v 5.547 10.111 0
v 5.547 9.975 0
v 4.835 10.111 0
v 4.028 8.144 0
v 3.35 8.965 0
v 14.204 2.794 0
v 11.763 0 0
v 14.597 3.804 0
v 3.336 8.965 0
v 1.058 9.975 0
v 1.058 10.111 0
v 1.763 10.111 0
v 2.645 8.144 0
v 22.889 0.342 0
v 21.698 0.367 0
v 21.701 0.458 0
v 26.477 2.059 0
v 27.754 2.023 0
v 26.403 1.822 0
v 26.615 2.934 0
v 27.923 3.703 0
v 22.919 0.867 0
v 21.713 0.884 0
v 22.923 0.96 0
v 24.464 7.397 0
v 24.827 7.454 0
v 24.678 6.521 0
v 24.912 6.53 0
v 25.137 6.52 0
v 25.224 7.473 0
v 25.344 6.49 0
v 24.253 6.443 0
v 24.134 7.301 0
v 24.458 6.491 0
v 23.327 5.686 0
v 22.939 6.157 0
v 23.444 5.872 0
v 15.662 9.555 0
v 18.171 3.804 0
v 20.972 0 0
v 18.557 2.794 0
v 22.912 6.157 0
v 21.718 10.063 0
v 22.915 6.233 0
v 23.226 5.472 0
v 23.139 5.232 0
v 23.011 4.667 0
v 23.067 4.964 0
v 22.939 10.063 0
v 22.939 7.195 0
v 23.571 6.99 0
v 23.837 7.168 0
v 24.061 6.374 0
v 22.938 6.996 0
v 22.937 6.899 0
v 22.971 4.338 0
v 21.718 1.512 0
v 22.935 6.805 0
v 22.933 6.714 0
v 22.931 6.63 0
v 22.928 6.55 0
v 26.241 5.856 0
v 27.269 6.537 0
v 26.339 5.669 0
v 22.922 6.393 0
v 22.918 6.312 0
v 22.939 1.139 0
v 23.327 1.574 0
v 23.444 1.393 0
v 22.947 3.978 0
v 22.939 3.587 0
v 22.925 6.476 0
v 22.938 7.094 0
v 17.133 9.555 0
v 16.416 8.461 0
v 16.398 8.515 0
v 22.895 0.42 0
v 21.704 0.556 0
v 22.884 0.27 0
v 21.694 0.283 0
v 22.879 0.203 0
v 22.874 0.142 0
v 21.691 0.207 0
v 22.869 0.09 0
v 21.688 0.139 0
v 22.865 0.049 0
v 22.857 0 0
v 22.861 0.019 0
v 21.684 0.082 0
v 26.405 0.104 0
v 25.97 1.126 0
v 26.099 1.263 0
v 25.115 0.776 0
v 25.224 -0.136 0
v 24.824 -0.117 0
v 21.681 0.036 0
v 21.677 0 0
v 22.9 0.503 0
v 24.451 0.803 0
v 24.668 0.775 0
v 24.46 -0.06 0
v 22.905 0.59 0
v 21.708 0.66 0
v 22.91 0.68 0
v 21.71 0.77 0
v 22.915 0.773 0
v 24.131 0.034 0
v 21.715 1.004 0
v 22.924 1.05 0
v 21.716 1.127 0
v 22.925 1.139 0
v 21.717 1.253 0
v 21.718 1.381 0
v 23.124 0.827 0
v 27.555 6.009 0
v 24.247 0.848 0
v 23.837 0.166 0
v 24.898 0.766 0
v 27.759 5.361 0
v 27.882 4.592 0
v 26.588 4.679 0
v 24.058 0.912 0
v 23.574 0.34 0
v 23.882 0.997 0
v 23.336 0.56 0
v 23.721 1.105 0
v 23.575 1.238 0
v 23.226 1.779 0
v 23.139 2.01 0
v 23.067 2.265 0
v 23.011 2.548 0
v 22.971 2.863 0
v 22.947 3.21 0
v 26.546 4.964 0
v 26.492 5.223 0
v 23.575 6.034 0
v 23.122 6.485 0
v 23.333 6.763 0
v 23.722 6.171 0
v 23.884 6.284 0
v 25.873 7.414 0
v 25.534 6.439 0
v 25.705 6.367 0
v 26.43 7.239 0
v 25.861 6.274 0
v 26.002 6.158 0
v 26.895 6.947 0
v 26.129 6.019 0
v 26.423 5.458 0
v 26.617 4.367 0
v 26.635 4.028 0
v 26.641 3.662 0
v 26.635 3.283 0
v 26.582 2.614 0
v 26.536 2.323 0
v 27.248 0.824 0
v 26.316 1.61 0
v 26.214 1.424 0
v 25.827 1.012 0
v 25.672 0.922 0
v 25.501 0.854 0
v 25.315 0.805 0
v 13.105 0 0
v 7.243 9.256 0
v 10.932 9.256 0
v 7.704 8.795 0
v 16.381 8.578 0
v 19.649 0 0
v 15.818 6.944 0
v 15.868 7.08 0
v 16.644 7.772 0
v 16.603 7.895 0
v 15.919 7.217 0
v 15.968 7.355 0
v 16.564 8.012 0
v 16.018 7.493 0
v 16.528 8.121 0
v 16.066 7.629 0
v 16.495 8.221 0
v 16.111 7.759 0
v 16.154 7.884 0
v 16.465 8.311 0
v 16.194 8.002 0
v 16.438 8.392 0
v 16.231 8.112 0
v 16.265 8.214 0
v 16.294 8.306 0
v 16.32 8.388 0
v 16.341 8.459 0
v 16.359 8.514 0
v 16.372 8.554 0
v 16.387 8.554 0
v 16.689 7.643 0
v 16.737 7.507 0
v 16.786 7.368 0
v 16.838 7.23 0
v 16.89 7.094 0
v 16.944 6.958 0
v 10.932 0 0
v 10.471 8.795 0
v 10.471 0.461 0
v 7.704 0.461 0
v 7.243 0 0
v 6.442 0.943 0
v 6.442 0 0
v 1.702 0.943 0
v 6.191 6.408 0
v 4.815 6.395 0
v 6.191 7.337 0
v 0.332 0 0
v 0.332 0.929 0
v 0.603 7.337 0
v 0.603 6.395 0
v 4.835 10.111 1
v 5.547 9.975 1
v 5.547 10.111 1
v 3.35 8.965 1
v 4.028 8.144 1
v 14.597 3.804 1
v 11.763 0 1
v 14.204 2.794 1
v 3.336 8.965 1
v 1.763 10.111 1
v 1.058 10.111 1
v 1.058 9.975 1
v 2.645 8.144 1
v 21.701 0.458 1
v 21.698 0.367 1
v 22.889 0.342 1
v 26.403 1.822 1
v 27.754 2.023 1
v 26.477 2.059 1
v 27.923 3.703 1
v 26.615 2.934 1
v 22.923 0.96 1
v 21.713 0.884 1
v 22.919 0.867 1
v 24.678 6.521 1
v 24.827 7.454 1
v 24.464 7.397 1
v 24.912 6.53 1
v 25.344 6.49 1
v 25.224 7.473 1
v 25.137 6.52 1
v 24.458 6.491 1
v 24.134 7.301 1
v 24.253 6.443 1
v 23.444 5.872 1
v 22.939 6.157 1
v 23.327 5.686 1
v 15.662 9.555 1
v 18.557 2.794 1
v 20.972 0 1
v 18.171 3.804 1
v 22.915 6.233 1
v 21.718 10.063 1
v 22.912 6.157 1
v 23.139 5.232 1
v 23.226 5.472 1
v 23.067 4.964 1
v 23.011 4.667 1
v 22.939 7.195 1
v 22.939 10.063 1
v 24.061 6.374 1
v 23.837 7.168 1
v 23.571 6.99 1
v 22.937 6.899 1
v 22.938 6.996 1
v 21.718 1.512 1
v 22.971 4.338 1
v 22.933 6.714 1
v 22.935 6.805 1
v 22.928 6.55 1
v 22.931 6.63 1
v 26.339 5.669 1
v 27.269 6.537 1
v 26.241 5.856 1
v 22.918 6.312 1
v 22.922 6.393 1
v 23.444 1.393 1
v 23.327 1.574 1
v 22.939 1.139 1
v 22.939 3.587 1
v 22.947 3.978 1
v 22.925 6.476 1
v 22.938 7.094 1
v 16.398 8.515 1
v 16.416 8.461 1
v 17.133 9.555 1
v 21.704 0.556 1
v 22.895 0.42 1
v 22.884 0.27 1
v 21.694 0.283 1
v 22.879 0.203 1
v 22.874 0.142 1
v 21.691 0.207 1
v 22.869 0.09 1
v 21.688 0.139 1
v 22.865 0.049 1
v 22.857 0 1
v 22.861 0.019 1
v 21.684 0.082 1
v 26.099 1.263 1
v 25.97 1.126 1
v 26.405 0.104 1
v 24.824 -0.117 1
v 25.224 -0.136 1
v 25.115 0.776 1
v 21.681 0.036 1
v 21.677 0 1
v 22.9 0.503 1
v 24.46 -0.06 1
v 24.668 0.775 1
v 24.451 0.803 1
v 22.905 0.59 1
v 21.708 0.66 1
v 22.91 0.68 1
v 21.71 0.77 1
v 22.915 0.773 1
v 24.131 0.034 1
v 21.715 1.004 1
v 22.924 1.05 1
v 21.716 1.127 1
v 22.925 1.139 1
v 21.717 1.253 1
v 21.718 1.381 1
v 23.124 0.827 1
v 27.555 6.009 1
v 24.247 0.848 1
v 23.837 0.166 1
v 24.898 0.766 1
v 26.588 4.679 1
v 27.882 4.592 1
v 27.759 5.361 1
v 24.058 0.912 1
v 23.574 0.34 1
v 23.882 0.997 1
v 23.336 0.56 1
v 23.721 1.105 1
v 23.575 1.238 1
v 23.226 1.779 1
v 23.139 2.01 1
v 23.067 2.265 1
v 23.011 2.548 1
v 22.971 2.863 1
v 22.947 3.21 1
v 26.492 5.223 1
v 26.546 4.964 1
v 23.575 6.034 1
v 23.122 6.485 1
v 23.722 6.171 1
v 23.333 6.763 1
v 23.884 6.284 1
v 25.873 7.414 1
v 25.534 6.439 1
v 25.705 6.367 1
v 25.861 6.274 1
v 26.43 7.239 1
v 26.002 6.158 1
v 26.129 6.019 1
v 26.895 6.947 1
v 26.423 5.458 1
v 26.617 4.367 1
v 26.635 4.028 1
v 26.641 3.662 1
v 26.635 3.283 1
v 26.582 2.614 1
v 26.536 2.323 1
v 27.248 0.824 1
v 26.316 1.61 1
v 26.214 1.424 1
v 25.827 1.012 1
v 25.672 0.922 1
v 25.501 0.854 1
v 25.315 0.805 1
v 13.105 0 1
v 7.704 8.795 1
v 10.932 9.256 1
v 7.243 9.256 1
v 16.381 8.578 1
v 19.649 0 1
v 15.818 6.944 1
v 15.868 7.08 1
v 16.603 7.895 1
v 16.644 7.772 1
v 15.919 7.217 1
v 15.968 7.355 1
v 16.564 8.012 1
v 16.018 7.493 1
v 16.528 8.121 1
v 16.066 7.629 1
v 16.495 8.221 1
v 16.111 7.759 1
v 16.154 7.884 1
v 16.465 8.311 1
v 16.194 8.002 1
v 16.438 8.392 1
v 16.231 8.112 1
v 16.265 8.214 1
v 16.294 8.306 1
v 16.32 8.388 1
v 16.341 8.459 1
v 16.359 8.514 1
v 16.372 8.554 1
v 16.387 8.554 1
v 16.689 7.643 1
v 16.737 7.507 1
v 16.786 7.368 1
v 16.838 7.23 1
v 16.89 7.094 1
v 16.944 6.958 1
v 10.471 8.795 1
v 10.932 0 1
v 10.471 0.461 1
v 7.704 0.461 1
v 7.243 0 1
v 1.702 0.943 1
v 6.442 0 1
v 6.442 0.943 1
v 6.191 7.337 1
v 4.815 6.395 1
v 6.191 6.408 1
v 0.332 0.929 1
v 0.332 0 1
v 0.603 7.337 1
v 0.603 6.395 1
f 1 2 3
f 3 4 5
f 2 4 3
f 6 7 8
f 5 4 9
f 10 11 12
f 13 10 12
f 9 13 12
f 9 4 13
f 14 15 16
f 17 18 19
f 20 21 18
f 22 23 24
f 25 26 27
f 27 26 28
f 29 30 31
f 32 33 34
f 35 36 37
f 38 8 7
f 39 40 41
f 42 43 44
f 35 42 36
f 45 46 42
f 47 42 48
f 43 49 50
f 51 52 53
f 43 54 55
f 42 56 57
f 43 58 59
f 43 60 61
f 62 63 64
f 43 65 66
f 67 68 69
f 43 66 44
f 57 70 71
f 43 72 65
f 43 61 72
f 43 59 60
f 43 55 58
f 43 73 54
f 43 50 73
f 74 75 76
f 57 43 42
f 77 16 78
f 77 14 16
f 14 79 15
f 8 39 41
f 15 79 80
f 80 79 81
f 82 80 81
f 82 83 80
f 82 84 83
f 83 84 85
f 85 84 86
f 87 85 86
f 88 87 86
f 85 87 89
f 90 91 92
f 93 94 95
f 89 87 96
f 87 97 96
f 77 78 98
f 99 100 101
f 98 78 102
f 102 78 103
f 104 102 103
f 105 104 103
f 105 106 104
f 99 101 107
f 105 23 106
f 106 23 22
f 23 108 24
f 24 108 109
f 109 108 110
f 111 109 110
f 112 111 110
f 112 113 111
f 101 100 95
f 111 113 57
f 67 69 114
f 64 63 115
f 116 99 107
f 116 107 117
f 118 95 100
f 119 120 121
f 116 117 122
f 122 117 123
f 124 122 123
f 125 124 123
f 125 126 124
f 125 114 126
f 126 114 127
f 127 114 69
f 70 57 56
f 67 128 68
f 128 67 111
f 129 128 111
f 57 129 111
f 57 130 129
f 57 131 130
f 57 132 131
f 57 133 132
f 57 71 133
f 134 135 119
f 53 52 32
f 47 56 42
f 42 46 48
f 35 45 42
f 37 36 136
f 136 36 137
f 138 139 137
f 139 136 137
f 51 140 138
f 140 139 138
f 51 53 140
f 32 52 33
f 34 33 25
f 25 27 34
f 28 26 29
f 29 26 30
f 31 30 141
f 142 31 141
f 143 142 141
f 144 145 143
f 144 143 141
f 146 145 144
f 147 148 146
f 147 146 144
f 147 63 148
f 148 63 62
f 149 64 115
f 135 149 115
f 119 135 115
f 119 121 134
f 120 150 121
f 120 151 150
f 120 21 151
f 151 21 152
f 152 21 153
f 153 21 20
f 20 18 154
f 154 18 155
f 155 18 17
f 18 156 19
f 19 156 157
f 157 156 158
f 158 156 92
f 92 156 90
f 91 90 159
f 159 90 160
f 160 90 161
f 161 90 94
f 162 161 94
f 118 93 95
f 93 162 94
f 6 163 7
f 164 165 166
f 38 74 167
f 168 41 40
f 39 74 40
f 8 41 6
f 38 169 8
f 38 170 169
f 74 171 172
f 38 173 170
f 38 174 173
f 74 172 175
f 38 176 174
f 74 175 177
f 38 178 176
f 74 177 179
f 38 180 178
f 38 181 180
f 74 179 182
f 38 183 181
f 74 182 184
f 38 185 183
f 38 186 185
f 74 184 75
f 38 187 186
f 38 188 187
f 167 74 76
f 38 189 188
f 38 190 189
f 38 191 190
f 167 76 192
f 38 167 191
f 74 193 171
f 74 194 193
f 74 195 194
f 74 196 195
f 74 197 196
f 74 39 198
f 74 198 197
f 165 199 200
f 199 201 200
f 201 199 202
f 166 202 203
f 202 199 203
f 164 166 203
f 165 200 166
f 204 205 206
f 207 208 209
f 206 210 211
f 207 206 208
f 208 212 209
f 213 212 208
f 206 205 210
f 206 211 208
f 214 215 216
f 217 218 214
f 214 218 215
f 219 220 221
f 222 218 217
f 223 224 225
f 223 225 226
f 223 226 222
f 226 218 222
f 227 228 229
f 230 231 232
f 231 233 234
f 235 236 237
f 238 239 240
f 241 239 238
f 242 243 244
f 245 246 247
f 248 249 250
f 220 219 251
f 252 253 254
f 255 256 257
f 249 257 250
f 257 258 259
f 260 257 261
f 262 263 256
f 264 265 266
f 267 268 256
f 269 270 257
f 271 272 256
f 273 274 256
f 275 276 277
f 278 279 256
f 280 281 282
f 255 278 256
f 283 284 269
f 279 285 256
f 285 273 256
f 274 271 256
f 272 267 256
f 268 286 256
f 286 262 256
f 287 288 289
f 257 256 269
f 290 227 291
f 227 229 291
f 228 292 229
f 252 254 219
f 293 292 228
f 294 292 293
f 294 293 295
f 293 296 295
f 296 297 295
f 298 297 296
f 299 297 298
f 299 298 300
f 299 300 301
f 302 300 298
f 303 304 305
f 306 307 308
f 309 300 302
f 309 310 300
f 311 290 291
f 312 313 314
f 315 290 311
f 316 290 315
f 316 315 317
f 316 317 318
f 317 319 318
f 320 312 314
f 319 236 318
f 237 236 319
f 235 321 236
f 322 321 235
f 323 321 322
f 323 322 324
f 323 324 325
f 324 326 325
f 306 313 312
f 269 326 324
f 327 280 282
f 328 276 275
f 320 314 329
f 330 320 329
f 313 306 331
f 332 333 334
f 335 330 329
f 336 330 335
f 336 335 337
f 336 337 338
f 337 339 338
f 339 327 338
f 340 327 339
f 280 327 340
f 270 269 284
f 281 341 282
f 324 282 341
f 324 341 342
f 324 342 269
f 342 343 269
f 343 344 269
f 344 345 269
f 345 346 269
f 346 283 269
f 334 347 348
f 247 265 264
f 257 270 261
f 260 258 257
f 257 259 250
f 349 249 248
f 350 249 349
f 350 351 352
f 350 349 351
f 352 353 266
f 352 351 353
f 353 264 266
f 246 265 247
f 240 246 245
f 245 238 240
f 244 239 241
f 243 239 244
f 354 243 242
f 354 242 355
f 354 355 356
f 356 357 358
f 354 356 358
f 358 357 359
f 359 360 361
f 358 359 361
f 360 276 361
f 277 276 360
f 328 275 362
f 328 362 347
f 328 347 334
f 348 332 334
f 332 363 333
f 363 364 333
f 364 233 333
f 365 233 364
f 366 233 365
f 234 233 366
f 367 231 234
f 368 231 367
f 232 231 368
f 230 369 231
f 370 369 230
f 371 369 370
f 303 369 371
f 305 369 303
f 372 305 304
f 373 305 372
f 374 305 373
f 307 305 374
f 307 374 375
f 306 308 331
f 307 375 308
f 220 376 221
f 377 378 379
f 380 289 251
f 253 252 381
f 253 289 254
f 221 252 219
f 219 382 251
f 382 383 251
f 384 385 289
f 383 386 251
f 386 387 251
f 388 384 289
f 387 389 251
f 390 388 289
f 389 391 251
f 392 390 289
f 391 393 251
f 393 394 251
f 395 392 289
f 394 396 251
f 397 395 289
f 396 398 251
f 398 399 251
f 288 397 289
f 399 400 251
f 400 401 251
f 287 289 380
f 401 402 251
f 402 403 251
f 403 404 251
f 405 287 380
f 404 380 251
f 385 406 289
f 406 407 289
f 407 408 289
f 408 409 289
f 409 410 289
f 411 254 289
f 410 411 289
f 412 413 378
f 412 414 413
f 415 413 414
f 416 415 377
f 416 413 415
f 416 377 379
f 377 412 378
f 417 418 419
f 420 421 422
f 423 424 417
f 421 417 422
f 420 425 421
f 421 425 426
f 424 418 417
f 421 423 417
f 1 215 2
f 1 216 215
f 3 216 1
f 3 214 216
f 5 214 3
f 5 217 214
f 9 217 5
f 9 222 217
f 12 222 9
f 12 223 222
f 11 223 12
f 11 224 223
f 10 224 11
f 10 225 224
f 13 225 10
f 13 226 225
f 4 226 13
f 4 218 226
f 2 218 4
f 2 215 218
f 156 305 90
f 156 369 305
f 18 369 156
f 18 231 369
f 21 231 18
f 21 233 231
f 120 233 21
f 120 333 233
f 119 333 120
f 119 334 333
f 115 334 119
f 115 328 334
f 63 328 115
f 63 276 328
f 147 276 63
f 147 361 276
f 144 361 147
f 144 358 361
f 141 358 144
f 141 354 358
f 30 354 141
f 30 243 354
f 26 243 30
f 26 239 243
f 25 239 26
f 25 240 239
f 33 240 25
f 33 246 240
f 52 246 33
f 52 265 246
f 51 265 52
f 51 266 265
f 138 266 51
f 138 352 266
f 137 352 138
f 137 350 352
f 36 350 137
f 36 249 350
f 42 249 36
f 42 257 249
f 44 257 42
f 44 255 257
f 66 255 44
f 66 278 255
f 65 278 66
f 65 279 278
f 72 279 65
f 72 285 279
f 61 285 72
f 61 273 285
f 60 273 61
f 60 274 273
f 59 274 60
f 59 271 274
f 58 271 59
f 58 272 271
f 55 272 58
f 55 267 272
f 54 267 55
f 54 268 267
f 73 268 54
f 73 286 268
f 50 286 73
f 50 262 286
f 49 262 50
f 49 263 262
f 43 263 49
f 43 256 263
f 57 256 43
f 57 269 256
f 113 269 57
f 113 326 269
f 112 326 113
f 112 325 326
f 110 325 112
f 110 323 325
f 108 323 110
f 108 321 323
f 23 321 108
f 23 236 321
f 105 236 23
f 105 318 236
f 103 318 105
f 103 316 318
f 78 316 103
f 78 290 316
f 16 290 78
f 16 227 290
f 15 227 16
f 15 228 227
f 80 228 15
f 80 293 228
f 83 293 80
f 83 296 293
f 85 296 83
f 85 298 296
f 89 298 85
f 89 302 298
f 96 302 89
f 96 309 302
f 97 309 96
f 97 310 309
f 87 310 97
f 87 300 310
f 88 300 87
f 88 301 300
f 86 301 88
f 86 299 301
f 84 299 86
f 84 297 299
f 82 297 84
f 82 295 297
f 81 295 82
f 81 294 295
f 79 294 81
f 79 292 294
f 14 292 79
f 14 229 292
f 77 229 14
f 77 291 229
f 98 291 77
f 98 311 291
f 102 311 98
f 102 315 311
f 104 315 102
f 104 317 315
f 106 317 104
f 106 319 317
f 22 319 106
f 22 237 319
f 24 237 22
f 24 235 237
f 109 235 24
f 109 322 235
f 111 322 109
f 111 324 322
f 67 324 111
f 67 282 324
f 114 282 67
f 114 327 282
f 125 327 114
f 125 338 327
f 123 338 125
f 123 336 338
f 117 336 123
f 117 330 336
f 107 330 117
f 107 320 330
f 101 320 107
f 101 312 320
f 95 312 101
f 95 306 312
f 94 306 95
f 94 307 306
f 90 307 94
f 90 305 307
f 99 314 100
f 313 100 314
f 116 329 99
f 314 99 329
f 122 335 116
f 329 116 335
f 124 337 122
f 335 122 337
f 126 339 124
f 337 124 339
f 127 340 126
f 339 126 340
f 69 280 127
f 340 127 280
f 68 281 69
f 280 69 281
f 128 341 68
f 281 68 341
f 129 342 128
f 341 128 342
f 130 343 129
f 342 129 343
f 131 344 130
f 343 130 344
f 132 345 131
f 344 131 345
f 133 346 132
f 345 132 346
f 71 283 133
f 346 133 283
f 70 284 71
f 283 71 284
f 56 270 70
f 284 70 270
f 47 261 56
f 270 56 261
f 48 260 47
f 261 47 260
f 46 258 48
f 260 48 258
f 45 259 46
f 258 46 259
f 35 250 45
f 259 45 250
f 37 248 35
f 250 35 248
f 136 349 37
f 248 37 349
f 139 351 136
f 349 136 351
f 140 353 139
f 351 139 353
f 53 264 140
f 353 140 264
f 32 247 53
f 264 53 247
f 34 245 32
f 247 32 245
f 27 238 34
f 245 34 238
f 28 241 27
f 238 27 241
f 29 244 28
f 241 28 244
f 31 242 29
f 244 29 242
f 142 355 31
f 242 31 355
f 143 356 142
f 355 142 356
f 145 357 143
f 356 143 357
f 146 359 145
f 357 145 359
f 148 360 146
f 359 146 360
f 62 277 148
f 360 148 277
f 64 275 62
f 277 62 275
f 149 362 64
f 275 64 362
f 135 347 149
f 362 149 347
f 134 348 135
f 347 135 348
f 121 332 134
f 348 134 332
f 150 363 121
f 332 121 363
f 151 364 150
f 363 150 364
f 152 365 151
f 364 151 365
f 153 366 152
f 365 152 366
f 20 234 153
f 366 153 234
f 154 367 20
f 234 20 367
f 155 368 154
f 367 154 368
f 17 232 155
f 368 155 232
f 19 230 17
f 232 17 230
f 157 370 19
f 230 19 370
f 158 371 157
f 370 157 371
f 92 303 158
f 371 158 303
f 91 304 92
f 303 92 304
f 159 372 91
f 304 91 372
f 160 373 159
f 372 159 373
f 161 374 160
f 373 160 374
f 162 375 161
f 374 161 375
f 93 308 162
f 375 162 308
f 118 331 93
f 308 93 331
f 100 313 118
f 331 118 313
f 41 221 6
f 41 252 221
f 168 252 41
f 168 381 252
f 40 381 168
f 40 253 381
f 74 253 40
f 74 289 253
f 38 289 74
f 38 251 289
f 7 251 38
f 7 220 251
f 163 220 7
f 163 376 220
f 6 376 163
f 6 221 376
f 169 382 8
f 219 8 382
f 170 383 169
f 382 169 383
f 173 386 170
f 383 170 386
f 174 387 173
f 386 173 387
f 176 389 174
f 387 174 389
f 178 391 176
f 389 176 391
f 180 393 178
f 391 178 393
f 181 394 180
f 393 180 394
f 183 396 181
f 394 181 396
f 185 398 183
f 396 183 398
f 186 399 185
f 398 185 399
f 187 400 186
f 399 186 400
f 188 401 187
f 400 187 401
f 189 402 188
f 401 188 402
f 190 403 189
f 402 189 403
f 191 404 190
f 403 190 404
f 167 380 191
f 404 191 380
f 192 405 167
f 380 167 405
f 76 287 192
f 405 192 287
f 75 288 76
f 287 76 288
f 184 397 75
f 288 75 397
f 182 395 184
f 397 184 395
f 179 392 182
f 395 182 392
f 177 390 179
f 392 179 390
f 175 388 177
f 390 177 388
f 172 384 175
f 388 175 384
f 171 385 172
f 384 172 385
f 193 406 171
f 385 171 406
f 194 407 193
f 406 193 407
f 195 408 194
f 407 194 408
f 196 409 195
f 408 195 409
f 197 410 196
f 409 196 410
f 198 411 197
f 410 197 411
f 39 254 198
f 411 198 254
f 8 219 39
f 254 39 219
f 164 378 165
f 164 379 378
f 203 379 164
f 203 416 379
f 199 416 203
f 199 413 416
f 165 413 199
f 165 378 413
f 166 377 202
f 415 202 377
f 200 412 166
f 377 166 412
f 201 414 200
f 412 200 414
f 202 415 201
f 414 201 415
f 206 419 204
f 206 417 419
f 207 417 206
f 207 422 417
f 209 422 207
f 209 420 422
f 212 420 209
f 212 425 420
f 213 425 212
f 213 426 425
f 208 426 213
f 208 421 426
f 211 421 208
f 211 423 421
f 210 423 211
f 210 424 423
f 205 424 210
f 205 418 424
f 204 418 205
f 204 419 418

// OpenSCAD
s = "Příliš žluťoučký kůň 😀 end";
echo(len(s), s[0], s[1], s[2], s[6], s[20], s[21], s[22], s[len(s)-1], s[len(s)]);
echo(ord("ž"), ord("😀"), ord("a"), ord(""), chr(382), chr(128512), chr(65), chr(0), chr(-1), chr(1114112), chr(55296), chr([380, 382, 128512]));
echo(search("ž", s), search("ň", s, 0), search("žk", s, 0), search("x", s), search("😀", s));
echo(search("ž", [["ž", 1], ["k", 2], ["😀", 3]]), search("😀k", [["ž", 1], ["k", 2], ["😀", 3]], 0));
echo(str("a", "ž", "😀"), concat(["ž"], ["😀"]), [for (c = s) c]);
linear_extrude(1) text("ž😀Ab", size=10);
